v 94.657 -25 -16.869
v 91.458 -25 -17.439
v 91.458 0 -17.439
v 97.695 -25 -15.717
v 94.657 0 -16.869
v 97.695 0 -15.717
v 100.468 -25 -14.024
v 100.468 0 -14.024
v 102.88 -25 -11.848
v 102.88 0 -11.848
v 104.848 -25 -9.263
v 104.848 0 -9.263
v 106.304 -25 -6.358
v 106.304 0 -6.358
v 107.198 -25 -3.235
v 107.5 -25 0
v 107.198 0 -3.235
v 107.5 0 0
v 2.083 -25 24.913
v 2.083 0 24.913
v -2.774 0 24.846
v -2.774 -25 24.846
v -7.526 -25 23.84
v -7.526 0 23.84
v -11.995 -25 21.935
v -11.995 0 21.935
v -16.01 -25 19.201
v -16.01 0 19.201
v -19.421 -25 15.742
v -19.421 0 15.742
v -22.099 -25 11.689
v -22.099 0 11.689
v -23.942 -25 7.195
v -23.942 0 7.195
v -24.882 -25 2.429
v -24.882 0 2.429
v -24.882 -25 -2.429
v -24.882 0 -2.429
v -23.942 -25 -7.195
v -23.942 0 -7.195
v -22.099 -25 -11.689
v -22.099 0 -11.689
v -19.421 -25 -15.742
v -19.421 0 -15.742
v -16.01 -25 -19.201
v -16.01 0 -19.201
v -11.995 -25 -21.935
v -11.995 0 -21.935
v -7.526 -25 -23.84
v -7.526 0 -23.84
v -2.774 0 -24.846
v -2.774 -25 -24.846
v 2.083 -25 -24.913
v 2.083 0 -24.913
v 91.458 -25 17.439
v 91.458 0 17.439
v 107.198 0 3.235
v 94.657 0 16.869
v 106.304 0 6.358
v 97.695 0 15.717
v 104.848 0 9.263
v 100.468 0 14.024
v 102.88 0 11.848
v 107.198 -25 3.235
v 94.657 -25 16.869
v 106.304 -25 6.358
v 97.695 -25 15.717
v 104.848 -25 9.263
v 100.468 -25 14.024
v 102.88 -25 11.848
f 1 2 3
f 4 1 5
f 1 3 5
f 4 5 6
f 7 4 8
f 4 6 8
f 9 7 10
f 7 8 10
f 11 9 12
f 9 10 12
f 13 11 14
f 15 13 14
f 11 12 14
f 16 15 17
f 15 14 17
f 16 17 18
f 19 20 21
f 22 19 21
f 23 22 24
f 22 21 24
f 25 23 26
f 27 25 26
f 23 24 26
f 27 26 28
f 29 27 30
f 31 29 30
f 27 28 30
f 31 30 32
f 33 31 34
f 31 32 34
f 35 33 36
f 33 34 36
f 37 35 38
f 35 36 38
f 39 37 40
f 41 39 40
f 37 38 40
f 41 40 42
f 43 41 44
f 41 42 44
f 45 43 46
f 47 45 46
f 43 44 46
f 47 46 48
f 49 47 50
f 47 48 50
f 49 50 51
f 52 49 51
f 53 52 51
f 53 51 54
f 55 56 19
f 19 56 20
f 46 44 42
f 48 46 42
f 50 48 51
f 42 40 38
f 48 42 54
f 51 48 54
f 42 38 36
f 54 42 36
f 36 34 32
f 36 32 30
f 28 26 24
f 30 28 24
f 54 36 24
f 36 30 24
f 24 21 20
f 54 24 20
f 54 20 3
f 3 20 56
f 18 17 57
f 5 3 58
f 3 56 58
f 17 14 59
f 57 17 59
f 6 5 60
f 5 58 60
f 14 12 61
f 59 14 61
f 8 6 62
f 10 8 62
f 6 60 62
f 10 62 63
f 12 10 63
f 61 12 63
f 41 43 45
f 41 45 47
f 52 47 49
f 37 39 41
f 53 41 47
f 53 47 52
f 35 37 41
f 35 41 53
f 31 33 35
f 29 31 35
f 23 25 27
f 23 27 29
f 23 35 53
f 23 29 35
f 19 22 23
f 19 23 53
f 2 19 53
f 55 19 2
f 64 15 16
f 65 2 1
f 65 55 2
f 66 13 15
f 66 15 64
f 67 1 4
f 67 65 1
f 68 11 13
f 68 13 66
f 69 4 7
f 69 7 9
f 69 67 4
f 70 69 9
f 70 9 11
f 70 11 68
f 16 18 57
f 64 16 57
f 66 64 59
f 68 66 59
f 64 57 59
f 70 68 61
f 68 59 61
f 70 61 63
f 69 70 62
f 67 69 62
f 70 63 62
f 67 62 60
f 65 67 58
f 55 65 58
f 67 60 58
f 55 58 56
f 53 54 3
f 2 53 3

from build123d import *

# Parameters (mm, degrees)
F1_DEPTH = 25


with BuildPart() as f1:
    # F0 (on Front) → F1 (new body)
    with BuildSketch(Plane.XZ):
        with BuildLine():
            ThreePointArc((107.5, 0), (102.879651, 11.847556), (91.458333, 17.43913))
            ThreePointArc((91.458333, 17.43913), (72.5, 0), (91.458333, -17.43913))
            ThreePointArc((91.458333, -17.43913), (102.879651, -11.847556), (107.5, 0))
        make_face()
        with BuildLine():
            ThreePointArc((2.083333, -24.913043), (18.399502, -16.92508), (25, 0))
            ThreePointArc((25, 0), (18.399502, 16.92508), (2.083333, 24.913043))
            ThreePointArc((2.083333, 24.913043), (-25, 0), (2.083333, -24.913043))
        make_face()
        with BuildLine():
            ThreePointArc((2.083333, 24.913043), (18.399502, 16.92508), (25, 0))
            ThreePointArc((25, 0), (18.399502, -16.92508), (2.083333, -24.913043))
            Line((2.083333, -24.913043), (91.458333, -17.43913))
            ThreePointArc((91.458333, -17.43913), (72.5, 0), (91.458333, 17.43913))
            Line((91.458333, 17.43913), (2.083333, 24.913043))
        make_face()
    extrude(amount=F1_DEPTH)


solid = f1.part
